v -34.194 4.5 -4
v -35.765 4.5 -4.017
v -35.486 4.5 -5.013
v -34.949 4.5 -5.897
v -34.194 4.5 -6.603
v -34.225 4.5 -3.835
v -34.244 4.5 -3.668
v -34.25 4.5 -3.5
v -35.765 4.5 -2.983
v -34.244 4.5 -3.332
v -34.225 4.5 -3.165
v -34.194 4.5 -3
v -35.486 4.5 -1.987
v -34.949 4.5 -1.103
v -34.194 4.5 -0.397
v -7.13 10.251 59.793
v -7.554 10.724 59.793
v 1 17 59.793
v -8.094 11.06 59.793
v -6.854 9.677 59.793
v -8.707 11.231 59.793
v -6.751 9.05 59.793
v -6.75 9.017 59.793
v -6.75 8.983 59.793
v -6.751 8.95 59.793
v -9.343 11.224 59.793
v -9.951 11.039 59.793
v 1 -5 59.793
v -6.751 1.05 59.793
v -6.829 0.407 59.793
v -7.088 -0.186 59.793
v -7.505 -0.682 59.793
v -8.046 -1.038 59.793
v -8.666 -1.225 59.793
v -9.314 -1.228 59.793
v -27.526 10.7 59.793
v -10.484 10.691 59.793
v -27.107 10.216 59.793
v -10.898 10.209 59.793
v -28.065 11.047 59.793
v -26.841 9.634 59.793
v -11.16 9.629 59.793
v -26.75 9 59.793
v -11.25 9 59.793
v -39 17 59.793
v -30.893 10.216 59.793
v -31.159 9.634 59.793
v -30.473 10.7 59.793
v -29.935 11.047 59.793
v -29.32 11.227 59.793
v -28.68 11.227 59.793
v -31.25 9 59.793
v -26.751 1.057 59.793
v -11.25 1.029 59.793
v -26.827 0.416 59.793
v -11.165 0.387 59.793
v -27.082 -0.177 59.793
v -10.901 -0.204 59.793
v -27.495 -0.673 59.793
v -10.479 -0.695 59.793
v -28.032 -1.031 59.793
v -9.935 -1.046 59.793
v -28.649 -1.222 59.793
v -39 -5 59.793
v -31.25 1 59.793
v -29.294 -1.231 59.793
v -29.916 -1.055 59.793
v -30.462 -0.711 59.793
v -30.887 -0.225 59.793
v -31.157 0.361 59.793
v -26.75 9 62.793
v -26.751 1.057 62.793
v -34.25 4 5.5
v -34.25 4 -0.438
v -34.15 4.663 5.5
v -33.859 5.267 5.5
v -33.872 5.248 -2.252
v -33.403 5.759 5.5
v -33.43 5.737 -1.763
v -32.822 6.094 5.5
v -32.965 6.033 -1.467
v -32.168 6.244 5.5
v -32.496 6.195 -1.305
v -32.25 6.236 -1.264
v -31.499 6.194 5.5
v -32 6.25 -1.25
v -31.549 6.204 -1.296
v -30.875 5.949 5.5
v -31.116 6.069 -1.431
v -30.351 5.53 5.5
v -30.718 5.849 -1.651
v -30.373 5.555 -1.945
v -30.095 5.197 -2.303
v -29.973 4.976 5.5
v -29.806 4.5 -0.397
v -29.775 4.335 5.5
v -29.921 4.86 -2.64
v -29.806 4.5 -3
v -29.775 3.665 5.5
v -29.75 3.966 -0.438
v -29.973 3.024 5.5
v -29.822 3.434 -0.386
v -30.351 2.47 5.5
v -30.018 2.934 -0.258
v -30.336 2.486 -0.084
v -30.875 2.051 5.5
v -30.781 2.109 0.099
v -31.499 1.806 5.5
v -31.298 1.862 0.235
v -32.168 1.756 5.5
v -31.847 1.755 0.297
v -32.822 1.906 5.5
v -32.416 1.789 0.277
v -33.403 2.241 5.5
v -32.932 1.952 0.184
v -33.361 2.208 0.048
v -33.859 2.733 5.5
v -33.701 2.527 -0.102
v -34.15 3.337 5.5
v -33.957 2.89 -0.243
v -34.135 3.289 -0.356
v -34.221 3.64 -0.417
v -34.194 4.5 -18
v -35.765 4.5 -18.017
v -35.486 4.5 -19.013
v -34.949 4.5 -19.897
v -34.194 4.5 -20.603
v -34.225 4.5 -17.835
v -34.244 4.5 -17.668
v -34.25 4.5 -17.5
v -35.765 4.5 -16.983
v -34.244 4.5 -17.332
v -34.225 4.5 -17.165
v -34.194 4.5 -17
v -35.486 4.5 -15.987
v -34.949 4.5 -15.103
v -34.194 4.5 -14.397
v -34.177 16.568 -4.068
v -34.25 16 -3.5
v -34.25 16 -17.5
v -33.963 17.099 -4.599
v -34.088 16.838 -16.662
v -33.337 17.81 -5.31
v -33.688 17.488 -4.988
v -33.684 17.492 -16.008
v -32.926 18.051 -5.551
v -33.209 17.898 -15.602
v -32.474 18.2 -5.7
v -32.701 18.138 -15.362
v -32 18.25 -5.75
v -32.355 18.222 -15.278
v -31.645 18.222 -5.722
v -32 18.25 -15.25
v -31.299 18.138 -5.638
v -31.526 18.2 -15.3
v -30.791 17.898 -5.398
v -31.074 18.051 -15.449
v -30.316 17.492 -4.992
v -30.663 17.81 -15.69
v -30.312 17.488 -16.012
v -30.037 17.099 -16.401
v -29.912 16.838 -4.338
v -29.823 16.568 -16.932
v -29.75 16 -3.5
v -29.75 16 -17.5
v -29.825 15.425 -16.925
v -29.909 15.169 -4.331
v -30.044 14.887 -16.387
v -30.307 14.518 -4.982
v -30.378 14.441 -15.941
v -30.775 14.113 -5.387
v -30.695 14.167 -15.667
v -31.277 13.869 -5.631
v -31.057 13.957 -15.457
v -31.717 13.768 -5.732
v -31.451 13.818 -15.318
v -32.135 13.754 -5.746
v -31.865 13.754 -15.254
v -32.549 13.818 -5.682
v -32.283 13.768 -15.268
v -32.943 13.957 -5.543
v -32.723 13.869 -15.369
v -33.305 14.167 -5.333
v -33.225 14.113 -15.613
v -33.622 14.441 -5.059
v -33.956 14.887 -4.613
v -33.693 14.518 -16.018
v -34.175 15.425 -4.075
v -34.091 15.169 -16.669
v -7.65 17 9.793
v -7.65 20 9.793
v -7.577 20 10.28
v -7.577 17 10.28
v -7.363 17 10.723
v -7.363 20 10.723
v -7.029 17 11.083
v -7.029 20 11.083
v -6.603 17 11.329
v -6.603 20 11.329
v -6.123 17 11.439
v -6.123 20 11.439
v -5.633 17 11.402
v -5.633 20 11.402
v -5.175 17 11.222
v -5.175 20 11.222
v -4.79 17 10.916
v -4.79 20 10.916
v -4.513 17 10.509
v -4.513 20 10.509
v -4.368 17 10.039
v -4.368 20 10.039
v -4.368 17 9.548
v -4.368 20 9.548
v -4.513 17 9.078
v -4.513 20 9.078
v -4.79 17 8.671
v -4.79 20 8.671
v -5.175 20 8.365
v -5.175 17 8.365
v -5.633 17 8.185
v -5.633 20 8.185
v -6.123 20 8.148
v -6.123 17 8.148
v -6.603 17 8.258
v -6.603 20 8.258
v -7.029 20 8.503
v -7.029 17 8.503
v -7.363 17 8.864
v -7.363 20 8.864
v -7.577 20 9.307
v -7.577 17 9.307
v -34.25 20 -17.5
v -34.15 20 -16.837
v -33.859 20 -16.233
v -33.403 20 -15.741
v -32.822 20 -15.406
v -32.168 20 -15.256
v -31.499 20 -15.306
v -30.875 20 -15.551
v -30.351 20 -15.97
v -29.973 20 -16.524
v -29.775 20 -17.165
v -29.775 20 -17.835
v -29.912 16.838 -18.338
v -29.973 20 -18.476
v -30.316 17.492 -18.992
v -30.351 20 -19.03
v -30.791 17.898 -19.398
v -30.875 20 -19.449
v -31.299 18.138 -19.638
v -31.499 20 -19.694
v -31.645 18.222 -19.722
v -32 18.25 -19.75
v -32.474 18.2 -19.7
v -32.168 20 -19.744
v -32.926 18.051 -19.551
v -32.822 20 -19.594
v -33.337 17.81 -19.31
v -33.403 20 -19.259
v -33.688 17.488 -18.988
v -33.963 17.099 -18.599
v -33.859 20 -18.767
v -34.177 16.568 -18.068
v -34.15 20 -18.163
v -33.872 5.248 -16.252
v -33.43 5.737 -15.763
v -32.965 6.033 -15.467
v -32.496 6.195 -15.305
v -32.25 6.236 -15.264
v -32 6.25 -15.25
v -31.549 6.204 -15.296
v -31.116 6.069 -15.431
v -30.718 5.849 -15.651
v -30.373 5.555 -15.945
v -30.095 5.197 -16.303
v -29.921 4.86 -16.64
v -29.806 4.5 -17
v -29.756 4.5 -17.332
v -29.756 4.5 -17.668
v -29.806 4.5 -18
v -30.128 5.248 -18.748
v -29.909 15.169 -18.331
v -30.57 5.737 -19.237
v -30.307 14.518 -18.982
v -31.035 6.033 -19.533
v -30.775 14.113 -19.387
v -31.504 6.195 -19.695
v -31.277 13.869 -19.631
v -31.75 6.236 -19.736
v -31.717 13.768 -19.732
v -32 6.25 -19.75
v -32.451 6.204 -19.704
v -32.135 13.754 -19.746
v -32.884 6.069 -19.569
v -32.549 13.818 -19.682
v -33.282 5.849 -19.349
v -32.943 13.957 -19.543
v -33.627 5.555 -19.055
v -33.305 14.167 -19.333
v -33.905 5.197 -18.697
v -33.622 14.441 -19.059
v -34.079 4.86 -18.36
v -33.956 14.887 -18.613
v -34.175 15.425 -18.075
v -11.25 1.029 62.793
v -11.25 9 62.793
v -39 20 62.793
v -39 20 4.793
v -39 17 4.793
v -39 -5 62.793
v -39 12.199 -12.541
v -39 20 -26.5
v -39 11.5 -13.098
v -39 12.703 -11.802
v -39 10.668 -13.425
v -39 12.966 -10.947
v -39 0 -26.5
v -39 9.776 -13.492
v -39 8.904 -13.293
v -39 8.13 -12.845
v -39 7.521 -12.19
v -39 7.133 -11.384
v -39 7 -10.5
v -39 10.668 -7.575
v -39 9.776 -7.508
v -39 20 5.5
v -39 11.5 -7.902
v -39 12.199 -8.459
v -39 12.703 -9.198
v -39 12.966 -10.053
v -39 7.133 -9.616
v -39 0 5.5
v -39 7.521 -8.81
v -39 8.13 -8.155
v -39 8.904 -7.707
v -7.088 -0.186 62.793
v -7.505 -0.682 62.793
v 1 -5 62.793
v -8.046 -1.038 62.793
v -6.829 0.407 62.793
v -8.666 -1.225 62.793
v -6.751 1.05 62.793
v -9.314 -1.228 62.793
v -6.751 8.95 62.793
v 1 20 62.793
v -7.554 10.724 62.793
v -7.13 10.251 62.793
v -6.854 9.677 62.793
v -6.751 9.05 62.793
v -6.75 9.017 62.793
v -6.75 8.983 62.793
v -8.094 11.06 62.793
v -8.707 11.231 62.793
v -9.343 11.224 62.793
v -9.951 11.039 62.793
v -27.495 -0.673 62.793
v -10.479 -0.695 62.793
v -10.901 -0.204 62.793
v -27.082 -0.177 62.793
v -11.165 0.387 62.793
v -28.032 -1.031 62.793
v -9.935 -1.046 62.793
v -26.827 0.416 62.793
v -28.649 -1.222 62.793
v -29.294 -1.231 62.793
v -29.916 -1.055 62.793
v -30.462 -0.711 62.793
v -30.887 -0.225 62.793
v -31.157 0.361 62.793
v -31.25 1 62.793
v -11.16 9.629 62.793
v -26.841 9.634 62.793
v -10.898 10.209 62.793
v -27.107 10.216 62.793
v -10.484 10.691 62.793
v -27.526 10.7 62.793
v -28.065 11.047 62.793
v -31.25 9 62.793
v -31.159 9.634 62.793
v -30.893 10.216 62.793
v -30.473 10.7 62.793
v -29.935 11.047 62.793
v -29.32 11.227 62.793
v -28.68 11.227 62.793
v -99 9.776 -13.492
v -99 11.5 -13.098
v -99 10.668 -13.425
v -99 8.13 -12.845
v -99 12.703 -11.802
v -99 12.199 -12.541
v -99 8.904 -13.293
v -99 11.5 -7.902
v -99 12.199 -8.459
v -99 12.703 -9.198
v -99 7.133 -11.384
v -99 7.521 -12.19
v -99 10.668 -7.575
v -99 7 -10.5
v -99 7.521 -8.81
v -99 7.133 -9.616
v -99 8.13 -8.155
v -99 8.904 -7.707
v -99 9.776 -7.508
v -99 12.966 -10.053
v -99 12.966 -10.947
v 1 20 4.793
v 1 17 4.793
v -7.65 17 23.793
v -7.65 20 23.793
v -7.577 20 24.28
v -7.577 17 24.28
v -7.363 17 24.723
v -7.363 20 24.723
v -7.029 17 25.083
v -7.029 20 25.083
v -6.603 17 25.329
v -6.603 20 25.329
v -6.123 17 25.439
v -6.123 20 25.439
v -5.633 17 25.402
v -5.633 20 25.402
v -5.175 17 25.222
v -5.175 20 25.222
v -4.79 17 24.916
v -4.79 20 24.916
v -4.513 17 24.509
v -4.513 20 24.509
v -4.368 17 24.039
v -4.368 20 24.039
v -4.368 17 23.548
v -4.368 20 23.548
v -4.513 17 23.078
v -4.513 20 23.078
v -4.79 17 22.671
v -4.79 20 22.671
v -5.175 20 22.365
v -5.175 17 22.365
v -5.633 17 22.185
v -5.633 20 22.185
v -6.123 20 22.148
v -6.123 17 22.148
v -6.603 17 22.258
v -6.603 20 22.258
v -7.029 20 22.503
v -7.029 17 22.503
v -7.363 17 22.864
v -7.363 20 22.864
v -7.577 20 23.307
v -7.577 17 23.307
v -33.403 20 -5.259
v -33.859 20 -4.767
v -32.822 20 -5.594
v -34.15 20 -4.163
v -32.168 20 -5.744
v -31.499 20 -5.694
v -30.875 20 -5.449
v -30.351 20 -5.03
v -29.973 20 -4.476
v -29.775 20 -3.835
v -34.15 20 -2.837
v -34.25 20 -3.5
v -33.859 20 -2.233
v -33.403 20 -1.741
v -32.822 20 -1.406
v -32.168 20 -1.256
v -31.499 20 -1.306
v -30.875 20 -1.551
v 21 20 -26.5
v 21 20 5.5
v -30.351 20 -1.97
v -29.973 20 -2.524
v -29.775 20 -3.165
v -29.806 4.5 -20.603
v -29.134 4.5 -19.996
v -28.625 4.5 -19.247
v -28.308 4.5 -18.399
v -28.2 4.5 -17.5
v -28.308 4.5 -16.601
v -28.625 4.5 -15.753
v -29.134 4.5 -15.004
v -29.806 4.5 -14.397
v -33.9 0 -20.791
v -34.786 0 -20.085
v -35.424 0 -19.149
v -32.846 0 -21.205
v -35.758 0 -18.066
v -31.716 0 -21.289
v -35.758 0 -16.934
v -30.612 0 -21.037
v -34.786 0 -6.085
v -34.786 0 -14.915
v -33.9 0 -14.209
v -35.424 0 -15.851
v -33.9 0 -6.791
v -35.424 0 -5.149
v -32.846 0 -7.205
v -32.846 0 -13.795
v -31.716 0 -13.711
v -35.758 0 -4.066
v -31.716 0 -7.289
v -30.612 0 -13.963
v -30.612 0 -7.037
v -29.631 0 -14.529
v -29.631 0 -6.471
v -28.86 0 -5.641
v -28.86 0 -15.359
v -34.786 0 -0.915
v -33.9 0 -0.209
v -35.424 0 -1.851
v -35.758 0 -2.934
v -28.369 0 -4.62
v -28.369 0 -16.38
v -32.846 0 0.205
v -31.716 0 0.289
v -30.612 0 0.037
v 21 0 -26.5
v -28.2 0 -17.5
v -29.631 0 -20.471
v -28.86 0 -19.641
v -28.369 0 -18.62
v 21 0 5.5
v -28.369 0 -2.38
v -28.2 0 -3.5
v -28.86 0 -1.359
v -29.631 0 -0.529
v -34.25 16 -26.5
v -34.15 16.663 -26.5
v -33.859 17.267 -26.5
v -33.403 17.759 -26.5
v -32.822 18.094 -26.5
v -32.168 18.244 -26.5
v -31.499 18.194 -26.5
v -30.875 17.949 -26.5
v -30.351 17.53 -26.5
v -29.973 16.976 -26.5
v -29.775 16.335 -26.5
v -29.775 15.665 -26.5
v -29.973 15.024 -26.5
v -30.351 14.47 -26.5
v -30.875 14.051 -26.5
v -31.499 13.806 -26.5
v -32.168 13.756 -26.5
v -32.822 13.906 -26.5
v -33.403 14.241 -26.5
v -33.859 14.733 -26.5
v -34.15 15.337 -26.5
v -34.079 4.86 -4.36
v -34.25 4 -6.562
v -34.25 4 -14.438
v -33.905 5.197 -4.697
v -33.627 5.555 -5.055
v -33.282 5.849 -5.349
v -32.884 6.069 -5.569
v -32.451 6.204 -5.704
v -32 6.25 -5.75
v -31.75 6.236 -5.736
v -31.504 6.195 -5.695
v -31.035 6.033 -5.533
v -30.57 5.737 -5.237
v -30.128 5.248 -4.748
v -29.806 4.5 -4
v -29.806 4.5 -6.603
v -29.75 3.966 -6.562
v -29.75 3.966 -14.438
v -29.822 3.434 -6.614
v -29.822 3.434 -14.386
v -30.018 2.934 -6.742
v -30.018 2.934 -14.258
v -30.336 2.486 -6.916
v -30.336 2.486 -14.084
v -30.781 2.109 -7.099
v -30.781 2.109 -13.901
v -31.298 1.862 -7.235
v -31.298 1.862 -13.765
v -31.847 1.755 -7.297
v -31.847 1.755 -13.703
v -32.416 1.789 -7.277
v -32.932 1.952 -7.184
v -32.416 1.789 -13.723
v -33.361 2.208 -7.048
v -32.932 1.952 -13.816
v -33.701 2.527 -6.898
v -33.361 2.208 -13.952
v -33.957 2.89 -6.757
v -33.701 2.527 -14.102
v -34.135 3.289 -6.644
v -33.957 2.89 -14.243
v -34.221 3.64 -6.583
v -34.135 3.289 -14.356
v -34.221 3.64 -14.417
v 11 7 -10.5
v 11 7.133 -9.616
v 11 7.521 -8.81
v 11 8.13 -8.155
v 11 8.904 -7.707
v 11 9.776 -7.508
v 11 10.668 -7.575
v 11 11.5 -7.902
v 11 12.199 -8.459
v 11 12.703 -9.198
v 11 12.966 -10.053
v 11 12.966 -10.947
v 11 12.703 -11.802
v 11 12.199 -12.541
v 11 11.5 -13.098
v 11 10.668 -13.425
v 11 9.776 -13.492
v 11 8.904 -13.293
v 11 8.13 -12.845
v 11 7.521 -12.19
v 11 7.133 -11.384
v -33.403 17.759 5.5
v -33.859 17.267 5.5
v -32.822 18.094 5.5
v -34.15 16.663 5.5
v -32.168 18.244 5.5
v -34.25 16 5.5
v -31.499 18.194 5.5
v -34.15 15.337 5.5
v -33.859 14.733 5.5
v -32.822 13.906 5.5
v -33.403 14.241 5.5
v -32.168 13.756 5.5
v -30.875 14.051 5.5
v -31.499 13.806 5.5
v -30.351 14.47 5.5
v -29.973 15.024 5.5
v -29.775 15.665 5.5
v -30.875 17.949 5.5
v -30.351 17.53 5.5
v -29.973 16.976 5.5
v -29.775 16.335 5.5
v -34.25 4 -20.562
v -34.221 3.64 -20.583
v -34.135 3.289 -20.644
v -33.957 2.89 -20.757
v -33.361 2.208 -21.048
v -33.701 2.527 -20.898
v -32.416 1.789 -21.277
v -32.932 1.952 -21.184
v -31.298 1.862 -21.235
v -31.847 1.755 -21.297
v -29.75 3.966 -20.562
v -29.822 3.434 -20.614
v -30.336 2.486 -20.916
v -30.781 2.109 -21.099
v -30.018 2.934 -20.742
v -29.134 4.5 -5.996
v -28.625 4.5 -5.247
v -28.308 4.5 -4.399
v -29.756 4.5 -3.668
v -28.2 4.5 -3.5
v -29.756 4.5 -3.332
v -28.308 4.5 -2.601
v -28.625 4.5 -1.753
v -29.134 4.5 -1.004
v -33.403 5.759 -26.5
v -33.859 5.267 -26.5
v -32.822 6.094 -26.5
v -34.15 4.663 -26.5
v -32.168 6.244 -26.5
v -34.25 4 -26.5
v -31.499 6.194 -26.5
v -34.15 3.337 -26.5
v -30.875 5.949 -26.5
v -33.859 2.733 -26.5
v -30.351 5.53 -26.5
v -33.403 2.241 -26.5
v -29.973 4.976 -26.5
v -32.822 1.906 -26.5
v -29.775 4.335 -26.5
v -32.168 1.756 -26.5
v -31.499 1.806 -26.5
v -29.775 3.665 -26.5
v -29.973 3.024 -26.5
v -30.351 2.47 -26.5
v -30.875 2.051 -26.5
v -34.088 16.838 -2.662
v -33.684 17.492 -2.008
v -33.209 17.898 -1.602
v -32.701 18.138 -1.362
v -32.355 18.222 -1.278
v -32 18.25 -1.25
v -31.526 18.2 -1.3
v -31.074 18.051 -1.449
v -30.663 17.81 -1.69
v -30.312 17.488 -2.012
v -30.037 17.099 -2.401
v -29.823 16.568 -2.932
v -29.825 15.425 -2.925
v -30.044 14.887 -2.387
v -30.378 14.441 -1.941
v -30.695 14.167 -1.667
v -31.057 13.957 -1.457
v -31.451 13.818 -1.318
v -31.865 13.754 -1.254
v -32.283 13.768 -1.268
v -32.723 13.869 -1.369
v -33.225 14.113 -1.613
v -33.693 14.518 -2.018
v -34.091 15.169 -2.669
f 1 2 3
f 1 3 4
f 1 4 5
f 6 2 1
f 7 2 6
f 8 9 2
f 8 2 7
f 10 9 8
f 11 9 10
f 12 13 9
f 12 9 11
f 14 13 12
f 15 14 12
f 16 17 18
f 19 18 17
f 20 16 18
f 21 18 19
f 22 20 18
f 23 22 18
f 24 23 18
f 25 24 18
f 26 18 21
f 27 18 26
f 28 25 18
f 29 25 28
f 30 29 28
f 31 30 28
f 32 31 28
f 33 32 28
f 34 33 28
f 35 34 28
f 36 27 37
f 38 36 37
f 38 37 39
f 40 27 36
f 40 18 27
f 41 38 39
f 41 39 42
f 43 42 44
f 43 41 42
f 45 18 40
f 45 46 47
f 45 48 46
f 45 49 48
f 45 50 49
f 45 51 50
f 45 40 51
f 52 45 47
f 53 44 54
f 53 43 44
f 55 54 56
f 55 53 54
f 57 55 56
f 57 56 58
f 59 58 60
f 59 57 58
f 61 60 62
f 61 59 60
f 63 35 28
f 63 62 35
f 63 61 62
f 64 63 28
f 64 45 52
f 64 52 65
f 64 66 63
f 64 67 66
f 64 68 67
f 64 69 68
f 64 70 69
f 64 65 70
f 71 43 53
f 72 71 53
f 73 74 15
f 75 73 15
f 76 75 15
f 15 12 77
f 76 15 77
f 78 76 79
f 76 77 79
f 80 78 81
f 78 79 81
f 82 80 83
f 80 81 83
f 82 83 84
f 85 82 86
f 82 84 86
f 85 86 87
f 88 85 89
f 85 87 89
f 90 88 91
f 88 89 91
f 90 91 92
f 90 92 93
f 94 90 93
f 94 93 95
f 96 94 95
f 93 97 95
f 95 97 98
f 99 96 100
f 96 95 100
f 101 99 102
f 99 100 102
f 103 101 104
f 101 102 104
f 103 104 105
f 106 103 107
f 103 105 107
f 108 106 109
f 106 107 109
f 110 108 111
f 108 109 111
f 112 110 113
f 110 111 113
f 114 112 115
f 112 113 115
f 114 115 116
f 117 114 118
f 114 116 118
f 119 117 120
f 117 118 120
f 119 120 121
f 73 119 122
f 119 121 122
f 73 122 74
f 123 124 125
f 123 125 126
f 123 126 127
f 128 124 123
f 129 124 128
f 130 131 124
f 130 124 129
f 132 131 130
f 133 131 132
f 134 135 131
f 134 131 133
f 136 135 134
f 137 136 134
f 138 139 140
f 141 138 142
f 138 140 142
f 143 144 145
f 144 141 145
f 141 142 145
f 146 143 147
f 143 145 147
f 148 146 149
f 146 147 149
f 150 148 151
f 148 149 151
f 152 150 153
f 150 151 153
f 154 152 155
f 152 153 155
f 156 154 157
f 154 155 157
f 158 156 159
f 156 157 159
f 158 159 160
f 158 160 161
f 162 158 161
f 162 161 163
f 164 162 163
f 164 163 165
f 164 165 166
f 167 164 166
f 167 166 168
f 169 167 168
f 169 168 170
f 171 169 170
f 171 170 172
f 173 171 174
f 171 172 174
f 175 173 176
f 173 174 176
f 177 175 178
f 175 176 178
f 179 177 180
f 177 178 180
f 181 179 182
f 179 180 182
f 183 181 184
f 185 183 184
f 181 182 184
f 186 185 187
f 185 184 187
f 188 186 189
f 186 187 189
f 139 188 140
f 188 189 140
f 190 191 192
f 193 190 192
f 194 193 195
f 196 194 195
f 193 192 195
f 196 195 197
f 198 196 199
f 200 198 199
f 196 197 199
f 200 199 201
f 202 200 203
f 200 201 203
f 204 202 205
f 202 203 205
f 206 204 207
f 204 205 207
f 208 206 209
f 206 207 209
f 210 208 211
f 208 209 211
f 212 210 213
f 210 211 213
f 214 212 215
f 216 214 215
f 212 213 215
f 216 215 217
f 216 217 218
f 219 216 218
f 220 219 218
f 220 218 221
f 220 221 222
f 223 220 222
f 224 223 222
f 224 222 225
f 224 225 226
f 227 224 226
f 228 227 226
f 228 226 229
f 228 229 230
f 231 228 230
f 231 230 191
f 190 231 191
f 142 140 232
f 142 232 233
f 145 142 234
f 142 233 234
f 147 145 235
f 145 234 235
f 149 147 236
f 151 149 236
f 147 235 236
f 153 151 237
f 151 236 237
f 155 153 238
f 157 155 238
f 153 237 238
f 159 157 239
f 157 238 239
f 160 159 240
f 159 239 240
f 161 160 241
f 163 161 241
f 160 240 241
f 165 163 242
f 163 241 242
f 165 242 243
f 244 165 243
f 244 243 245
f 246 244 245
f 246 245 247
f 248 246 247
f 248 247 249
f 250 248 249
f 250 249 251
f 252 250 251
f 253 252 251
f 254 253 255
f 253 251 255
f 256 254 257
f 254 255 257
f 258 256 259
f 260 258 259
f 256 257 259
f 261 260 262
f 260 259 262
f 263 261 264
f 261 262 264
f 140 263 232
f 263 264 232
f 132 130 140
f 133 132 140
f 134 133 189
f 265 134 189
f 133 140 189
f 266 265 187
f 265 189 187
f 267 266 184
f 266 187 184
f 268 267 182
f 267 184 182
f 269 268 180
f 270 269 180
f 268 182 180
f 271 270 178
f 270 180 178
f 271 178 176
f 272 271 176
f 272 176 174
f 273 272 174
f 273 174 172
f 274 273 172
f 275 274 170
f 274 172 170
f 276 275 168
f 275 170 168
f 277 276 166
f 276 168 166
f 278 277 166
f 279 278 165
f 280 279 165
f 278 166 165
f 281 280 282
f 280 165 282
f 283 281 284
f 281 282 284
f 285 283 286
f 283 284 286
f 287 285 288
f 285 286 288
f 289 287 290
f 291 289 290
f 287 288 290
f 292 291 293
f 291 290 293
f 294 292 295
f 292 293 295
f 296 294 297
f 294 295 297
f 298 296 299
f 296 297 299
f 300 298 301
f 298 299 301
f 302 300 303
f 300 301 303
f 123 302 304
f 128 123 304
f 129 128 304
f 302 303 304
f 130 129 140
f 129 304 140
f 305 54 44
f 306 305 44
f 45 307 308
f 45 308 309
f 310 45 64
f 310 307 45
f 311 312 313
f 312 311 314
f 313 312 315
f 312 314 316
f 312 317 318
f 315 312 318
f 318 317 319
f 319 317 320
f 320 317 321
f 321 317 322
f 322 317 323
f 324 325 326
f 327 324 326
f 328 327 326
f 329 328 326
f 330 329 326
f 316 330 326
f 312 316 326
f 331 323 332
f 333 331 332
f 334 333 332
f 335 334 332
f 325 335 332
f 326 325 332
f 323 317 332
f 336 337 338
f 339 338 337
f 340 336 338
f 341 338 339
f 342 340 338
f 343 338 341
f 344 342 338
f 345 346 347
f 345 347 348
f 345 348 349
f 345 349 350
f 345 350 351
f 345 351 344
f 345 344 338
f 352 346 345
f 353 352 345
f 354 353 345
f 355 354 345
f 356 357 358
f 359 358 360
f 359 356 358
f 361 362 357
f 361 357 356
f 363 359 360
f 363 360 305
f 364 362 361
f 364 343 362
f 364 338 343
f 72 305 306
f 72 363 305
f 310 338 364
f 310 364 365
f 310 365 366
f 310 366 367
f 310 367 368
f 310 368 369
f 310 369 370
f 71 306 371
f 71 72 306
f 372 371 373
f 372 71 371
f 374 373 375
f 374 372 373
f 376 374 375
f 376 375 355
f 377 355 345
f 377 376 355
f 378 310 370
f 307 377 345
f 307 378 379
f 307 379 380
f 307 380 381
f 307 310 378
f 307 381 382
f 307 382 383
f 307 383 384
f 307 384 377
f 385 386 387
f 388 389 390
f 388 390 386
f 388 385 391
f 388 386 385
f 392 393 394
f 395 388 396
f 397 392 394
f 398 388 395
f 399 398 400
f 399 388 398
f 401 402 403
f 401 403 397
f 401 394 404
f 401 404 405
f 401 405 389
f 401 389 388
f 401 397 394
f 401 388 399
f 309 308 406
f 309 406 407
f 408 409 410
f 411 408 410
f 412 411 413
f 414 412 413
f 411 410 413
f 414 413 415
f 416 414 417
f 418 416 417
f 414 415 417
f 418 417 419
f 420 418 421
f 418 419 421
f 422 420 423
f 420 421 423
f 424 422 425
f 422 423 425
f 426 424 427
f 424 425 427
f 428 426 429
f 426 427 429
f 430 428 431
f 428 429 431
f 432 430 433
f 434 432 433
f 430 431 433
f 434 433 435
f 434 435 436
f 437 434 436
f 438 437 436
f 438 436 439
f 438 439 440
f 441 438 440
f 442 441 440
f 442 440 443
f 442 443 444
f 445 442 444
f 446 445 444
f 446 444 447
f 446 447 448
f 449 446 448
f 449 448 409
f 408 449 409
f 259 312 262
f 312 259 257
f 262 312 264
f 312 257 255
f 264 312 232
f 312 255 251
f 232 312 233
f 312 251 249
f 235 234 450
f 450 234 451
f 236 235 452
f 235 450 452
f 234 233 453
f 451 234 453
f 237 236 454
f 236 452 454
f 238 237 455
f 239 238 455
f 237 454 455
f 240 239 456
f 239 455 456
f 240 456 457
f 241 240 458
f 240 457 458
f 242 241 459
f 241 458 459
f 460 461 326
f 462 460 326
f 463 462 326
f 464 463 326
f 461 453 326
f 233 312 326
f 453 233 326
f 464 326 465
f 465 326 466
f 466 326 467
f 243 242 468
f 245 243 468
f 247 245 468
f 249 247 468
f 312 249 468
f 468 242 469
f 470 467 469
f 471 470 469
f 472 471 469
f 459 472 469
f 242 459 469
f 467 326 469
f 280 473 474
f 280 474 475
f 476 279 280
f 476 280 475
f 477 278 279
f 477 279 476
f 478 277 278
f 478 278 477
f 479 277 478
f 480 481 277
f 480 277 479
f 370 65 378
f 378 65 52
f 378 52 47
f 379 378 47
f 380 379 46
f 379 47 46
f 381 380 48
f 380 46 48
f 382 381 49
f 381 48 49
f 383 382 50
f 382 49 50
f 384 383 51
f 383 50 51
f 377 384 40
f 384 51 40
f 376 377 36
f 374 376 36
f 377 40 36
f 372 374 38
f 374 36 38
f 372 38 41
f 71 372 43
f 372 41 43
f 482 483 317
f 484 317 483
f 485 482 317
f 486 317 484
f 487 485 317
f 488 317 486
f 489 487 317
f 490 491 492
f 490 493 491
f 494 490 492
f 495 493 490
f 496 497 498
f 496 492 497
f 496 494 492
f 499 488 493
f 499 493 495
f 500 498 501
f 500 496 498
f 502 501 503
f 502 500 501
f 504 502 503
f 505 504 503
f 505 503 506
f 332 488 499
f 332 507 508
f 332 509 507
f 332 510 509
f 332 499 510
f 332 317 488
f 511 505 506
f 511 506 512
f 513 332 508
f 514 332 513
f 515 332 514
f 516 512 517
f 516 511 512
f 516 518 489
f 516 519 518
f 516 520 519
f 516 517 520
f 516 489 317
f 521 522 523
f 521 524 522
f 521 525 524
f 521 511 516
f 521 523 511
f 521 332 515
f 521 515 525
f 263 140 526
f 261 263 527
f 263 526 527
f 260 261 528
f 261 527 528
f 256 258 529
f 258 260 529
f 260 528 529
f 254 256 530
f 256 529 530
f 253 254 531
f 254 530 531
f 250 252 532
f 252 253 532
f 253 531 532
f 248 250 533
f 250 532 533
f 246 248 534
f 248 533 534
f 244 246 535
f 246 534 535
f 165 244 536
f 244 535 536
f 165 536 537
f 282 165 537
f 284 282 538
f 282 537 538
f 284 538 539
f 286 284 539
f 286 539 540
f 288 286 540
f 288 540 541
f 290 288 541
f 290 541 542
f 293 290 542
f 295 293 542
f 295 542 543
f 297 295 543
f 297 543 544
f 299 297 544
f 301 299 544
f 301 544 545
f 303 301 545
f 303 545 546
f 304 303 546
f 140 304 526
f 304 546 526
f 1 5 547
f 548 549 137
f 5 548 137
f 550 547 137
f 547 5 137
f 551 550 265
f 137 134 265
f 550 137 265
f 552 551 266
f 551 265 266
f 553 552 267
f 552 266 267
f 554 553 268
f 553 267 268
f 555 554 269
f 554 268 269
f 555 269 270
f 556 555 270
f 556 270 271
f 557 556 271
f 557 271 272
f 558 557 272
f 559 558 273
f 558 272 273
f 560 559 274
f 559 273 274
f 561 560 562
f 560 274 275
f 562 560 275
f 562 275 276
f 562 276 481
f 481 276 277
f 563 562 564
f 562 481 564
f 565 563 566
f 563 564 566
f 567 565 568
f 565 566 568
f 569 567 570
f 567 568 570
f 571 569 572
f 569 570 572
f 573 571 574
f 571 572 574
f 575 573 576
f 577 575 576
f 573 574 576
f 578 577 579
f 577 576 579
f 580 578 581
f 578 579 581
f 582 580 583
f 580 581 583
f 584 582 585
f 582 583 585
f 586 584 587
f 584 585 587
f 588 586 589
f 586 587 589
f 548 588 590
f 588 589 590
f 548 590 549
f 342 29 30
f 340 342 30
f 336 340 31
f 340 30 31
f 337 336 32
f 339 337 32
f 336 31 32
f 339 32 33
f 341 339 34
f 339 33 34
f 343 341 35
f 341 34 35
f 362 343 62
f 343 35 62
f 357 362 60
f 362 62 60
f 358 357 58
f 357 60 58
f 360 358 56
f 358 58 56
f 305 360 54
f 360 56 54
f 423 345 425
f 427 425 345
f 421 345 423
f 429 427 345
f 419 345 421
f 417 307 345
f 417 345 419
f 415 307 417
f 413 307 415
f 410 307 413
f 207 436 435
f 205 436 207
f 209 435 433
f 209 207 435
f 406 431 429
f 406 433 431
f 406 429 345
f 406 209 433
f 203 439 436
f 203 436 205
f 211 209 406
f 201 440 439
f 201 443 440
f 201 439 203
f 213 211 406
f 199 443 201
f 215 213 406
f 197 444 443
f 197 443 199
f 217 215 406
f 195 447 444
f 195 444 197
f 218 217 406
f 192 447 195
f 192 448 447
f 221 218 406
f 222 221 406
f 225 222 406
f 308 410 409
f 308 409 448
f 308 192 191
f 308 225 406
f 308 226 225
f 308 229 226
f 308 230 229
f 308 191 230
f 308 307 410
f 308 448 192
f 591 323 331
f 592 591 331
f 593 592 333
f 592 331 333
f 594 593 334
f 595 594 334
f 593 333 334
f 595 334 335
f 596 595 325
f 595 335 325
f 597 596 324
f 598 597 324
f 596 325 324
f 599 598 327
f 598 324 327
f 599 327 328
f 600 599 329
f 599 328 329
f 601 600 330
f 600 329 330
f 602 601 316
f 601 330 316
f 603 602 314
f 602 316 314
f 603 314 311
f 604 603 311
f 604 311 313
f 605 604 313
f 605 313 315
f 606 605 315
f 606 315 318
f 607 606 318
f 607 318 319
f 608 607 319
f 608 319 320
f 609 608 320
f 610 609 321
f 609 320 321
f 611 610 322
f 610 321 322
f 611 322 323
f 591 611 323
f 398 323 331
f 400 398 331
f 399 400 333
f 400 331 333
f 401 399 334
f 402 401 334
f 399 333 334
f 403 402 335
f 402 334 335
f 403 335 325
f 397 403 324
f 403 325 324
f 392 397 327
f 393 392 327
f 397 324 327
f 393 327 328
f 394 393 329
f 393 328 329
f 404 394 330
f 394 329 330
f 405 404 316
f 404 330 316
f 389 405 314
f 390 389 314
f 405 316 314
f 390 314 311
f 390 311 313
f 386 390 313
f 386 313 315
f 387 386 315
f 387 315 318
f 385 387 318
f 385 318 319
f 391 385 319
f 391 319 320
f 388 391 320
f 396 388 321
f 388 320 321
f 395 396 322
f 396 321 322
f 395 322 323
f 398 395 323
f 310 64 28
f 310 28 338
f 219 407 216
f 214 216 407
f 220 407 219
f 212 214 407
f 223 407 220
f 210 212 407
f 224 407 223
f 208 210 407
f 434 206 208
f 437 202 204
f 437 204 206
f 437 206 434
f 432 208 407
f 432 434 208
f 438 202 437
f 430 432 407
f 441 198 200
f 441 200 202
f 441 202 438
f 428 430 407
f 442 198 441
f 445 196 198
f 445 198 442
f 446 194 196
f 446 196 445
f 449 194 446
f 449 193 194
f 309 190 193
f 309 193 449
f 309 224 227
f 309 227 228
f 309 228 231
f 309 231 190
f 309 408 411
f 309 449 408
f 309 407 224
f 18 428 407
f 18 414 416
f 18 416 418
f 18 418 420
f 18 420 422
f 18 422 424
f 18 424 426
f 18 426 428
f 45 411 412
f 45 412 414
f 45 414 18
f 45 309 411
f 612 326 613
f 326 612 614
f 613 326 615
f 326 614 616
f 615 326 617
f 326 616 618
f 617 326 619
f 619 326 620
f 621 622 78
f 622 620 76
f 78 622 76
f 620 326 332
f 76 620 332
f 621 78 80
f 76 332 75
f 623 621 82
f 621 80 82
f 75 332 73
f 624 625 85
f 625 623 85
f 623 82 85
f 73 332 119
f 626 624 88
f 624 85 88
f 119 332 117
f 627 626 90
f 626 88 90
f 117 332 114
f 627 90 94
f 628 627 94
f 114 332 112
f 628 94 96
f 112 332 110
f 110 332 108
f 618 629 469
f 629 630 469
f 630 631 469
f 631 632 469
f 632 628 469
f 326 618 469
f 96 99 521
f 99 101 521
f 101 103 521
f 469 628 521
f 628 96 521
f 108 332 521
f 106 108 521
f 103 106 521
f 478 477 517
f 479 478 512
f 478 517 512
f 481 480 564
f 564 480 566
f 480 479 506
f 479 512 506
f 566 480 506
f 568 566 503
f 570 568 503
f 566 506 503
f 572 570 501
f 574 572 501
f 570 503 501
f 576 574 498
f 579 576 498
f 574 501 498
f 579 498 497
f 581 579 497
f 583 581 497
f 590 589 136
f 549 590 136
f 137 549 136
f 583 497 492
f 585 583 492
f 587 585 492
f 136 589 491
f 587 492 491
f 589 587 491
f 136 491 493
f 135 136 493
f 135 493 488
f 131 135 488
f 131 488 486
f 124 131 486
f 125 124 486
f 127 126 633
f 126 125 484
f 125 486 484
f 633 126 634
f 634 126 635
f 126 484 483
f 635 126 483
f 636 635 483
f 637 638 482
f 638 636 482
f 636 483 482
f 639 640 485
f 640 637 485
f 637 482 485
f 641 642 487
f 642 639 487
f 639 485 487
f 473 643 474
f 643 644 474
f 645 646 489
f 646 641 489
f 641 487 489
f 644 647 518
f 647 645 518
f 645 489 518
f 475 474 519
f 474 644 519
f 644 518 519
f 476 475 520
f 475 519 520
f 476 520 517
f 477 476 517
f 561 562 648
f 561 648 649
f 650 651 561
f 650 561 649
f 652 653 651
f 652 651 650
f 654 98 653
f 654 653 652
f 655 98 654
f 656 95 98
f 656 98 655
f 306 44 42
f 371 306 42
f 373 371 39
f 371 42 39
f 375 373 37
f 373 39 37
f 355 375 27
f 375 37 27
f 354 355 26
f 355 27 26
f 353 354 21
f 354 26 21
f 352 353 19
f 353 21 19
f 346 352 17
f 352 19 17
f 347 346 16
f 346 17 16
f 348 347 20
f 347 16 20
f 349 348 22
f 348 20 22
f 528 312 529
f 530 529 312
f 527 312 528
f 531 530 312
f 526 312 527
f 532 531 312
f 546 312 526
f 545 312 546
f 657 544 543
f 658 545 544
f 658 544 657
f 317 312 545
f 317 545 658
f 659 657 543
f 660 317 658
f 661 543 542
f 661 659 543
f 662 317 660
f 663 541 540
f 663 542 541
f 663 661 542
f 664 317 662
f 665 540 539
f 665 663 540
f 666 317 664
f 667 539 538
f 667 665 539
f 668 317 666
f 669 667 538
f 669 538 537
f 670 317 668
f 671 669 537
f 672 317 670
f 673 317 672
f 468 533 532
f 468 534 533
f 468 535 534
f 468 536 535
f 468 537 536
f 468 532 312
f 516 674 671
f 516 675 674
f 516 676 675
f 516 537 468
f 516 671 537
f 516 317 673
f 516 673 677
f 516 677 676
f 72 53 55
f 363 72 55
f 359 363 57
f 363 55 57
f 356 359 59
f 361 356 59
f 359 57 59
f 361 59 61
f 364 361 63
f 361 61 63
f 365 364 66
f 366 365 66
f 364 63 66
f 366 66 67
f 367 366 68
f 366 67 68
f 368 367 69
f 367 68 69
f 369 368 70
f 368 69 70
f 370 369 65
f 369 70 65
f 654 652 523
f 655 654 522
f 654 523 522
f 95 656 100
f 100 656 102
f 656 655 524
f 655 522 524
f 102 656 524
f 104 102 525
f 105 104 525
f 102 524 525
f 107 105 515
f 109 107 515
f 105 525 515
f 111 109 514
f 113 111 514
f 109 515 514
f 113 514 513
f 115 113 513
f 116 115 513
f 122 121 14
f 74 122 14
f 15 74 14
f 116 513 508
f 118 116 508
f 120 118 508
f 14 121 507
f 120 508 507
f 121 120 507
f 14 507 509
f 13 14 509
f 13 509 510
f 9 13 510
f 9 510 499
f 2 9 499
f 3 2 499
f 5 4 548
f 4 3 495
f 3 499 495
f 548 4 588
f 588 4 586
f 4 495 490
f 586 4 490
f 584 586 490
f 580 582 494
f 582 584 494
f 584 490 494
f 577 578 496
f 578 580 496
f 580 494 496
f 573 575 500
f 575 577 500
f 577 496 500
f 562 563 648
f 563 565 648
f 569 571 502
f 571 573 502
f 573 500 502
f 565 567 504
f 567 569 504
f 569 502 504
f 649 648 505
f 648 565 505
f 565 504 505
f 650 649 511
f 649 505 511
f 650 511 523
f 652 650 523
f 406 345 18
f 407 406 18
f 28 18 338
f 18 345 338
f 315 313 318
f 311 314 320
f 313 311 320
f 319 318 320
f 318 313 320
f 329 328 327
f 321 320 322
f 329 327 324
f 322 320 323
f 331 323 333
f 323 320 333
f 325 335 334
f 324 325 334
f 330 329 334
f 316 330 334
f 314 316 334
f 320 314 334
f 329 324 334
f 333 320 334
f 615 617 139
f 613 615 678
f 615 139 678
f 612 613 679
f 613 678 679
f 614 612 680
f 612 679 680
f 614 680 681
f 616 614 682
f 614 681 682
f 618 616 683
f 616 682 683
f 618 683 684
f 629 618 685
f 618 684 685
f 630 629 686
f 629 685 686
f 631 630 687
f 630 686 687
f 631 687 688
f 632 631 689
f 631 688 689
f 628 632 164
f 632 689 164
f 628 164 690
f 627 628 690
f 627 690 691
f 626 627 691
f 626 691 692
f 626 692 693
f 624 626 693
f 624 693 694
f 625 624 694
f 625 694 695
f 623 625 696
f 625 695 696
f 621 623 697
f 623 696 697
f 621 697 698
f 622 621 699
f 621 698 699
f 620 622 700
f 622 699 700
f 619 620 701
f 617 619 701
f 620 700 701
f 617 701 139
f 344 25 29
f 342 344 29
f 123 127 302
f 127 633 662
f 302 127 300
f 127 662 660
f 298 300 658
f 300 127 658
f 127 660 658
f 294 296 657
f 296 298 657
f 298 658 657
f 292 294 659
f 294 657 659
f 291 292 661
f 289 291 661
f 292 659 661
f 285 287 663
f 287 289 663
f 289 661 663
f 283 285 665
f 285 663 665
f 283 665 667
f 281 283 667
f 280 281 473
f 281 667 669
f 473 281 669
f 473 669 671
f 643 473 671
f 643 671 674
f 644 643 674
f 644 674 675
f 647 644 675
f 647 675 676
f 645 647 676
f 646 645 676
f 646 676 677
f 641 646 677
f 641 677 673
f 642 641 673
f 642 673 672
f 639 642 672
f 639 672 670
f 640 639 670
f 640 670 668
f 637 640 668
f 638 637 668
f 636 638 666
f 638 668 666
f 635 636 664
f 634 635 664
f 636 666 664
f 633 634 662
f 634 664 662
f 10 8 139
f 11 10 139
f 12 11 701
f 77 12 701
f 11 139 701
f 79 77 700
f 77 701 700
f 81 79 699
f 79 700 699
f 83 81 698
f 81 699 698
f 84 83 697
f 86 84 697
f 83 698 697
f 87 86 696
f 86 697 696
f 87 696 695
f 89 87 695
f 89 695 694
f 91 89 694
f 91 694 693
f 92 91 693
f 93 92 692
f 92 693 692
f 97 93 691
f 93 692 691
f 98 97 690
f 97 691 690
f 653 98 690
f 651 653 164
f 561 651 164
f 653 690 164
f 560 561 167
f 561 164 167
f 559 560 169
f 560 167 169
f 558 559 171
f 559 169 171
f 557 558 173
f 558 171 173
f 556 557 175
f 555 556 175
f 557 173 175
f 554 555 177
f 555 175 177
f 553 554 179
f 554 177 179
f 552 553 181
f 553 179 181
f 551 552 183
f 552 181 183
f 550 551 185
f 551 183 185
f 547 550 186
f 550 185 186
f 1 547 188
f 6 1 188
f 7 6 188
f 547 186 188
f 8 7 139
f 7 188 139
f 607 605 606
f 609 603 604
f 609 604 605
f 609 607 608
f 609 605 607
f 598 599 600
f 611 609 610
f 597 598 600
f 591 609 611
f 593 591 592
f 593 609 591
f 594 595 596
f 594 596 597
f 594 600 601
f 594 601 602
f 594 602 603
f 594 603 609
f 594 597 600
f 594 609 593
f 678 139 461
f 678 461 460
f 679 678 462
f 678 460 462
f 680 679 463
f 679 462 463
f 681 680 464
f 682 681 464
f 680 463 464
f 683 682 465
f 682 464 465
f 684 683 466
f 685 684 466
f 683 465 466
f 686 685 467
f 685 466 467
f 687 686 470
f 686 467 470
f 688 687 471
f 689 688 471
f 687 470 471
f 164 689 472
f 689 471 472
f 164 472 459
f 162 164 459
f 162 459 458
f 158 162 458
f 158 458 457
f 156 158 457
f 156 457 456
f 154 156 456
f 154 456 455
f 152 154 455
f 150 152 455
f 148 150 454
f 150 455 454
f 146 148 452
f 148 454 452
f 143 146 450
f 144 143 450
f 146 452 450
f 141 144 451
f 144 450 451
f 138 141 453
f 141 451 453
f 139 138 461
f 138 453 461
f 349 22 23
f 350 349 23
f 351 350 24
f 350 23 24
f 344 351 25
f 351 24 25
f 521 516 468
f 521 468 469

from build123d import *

# Parameters (mm, degrees)
F0_W           = 60
F0_H           = 32
F1_DEPTH       = 20
F2_R           = 3
F3_DEPTH       = 60
F5_D           = 4.5
F5_CBORE_D     = 7.6
F5_CBORE_DEPTH = 4.5
F7_DEPTH       = 40
F10_D          = 4.5
F11_R          = 3
F12_DEPTH      = 50
F13_D          = 3.3
F15_DEPTH      = 25


with BuildPart() as f1:
    # F0 (on Front) → F1 (new body)
    with BuildSketch(Plane.XZ):
        with Locations((-9, -10.5)):
            Rectangle(F0_W, F0_H)
    extrude(amount=-F1_DEPTH)

    # F5 (through all)
    with Locations(Plane.XZ):
        with Locations((-32, -3.5), (-32, -17.5)):
            CounterBoreHole(F5_D / 2, F5_CBORE_D / 2, F5_CBORE_DEPTH)

    # F10 (through all)
    with Locations(Plane.XY.offset(5.5)):
        with Locations((-32, 16), (-32, 4)):
            Hole(F10_D / 2)

    # F11 (on face) → F12 (cut)
    with BuildSketch(Plane(origin=(-39, 0, 0), x_dir=(0, -1, 0), z_dir=(-1, 0, 0))):
        with Locations((-10, -10.5)):
            Circle(F11_R)
    extrude(amount=-F12_DEPTH, mode=Mode.SUBTRACT)


with BuildPart() as f3:
    # F2 (on face) → F3 (new body)
    with BuildSketch(Plane(origin=(-39, 0, 0), x_dir=(0, -1, 0), z_dir=(-1, 0, 0))):
        with Locations((-10, -10.5)):
            Circle(F2_R)
    extrude(amount=F3_DEPTH)


with BuildPart() as f7:
    # F6 (on face) → F7 (new body)
    with BuildSketch(Plane(origin=(-39, 0, 0), x_dir=(0, -1, 0), z_dir=(-1, 0, 0))):
        Polygon((-20, 62.7934455797), (-20, 4.7934455797), (-17, 4.7934455797), (-17, 59.7934455797), (5, 59.7934455797), (5, 62.7934455797), align=None)
    extrude(amount=-F7_DEPTH)

    # F13 (through all)
    with Locations(Plane.XZ.offset(-17)):
        with Locations((-6, 23.7934455797), (-6, 9.7934455797)):
            Hole(F13_D / 2)

    # F14 (on face) → F15 (cut)
    with BuildSketch(Plane(origin=(0, 0, 59.7934455797), x_dir=(1, 0, 0), z_dir=(0, 0, -1))):
        with BuildLine():
            Line((-26.7500000095, -8.9997930759), (-26.7507304485, -1.0573278685))
            ThreePointArc((-26.7507304485, -1.0573278685), (-28.9713337391, 1.2498173805), (-31.25, -1))
            Line((-31.25, -1), (-31.25, -9))
            ThreePointArc((-31.25, -9), (-28.9998965379, -11.2499999976), (-26.7500000095, -8.9997930759))
        make_face()
        with BuildLine():
            Line((-11.249809153, -1.0293048642), (-11.2499999994, -8.9999461268))
            ThreePointArc((-11.2499999994, -8.9999461268), (-9.025023839, -11.2498608418), (-6.750555418, -9.0499907226))
            Line((-6.750555418, -9.0499907226), (-6.750555418, -8.9500092774))
            Line((-6.750555418, -8.9500092774), (-6.750555418, -1.0499907226))
            ThreePointArc((-6.750555418, -1.0499907226), (-8.9896554646, 1.24997622), (-11.249809153, -1.0293048642))
        make_face()
        with BuildLine():
            Line((-6.750555418, -8.9500092774), (-6.750555418, -9.0499907226))
            ThreePointArc((-6.750555418, -9.0499907226), (-6.75, -9), (-6.750555418, -8.9500092774))
        make_face()
    extrude(amount=-F15_DEPTH, mode=Mode.SUBTRACT)


solid = Compound([f1.part, f3.part, f7.part])
